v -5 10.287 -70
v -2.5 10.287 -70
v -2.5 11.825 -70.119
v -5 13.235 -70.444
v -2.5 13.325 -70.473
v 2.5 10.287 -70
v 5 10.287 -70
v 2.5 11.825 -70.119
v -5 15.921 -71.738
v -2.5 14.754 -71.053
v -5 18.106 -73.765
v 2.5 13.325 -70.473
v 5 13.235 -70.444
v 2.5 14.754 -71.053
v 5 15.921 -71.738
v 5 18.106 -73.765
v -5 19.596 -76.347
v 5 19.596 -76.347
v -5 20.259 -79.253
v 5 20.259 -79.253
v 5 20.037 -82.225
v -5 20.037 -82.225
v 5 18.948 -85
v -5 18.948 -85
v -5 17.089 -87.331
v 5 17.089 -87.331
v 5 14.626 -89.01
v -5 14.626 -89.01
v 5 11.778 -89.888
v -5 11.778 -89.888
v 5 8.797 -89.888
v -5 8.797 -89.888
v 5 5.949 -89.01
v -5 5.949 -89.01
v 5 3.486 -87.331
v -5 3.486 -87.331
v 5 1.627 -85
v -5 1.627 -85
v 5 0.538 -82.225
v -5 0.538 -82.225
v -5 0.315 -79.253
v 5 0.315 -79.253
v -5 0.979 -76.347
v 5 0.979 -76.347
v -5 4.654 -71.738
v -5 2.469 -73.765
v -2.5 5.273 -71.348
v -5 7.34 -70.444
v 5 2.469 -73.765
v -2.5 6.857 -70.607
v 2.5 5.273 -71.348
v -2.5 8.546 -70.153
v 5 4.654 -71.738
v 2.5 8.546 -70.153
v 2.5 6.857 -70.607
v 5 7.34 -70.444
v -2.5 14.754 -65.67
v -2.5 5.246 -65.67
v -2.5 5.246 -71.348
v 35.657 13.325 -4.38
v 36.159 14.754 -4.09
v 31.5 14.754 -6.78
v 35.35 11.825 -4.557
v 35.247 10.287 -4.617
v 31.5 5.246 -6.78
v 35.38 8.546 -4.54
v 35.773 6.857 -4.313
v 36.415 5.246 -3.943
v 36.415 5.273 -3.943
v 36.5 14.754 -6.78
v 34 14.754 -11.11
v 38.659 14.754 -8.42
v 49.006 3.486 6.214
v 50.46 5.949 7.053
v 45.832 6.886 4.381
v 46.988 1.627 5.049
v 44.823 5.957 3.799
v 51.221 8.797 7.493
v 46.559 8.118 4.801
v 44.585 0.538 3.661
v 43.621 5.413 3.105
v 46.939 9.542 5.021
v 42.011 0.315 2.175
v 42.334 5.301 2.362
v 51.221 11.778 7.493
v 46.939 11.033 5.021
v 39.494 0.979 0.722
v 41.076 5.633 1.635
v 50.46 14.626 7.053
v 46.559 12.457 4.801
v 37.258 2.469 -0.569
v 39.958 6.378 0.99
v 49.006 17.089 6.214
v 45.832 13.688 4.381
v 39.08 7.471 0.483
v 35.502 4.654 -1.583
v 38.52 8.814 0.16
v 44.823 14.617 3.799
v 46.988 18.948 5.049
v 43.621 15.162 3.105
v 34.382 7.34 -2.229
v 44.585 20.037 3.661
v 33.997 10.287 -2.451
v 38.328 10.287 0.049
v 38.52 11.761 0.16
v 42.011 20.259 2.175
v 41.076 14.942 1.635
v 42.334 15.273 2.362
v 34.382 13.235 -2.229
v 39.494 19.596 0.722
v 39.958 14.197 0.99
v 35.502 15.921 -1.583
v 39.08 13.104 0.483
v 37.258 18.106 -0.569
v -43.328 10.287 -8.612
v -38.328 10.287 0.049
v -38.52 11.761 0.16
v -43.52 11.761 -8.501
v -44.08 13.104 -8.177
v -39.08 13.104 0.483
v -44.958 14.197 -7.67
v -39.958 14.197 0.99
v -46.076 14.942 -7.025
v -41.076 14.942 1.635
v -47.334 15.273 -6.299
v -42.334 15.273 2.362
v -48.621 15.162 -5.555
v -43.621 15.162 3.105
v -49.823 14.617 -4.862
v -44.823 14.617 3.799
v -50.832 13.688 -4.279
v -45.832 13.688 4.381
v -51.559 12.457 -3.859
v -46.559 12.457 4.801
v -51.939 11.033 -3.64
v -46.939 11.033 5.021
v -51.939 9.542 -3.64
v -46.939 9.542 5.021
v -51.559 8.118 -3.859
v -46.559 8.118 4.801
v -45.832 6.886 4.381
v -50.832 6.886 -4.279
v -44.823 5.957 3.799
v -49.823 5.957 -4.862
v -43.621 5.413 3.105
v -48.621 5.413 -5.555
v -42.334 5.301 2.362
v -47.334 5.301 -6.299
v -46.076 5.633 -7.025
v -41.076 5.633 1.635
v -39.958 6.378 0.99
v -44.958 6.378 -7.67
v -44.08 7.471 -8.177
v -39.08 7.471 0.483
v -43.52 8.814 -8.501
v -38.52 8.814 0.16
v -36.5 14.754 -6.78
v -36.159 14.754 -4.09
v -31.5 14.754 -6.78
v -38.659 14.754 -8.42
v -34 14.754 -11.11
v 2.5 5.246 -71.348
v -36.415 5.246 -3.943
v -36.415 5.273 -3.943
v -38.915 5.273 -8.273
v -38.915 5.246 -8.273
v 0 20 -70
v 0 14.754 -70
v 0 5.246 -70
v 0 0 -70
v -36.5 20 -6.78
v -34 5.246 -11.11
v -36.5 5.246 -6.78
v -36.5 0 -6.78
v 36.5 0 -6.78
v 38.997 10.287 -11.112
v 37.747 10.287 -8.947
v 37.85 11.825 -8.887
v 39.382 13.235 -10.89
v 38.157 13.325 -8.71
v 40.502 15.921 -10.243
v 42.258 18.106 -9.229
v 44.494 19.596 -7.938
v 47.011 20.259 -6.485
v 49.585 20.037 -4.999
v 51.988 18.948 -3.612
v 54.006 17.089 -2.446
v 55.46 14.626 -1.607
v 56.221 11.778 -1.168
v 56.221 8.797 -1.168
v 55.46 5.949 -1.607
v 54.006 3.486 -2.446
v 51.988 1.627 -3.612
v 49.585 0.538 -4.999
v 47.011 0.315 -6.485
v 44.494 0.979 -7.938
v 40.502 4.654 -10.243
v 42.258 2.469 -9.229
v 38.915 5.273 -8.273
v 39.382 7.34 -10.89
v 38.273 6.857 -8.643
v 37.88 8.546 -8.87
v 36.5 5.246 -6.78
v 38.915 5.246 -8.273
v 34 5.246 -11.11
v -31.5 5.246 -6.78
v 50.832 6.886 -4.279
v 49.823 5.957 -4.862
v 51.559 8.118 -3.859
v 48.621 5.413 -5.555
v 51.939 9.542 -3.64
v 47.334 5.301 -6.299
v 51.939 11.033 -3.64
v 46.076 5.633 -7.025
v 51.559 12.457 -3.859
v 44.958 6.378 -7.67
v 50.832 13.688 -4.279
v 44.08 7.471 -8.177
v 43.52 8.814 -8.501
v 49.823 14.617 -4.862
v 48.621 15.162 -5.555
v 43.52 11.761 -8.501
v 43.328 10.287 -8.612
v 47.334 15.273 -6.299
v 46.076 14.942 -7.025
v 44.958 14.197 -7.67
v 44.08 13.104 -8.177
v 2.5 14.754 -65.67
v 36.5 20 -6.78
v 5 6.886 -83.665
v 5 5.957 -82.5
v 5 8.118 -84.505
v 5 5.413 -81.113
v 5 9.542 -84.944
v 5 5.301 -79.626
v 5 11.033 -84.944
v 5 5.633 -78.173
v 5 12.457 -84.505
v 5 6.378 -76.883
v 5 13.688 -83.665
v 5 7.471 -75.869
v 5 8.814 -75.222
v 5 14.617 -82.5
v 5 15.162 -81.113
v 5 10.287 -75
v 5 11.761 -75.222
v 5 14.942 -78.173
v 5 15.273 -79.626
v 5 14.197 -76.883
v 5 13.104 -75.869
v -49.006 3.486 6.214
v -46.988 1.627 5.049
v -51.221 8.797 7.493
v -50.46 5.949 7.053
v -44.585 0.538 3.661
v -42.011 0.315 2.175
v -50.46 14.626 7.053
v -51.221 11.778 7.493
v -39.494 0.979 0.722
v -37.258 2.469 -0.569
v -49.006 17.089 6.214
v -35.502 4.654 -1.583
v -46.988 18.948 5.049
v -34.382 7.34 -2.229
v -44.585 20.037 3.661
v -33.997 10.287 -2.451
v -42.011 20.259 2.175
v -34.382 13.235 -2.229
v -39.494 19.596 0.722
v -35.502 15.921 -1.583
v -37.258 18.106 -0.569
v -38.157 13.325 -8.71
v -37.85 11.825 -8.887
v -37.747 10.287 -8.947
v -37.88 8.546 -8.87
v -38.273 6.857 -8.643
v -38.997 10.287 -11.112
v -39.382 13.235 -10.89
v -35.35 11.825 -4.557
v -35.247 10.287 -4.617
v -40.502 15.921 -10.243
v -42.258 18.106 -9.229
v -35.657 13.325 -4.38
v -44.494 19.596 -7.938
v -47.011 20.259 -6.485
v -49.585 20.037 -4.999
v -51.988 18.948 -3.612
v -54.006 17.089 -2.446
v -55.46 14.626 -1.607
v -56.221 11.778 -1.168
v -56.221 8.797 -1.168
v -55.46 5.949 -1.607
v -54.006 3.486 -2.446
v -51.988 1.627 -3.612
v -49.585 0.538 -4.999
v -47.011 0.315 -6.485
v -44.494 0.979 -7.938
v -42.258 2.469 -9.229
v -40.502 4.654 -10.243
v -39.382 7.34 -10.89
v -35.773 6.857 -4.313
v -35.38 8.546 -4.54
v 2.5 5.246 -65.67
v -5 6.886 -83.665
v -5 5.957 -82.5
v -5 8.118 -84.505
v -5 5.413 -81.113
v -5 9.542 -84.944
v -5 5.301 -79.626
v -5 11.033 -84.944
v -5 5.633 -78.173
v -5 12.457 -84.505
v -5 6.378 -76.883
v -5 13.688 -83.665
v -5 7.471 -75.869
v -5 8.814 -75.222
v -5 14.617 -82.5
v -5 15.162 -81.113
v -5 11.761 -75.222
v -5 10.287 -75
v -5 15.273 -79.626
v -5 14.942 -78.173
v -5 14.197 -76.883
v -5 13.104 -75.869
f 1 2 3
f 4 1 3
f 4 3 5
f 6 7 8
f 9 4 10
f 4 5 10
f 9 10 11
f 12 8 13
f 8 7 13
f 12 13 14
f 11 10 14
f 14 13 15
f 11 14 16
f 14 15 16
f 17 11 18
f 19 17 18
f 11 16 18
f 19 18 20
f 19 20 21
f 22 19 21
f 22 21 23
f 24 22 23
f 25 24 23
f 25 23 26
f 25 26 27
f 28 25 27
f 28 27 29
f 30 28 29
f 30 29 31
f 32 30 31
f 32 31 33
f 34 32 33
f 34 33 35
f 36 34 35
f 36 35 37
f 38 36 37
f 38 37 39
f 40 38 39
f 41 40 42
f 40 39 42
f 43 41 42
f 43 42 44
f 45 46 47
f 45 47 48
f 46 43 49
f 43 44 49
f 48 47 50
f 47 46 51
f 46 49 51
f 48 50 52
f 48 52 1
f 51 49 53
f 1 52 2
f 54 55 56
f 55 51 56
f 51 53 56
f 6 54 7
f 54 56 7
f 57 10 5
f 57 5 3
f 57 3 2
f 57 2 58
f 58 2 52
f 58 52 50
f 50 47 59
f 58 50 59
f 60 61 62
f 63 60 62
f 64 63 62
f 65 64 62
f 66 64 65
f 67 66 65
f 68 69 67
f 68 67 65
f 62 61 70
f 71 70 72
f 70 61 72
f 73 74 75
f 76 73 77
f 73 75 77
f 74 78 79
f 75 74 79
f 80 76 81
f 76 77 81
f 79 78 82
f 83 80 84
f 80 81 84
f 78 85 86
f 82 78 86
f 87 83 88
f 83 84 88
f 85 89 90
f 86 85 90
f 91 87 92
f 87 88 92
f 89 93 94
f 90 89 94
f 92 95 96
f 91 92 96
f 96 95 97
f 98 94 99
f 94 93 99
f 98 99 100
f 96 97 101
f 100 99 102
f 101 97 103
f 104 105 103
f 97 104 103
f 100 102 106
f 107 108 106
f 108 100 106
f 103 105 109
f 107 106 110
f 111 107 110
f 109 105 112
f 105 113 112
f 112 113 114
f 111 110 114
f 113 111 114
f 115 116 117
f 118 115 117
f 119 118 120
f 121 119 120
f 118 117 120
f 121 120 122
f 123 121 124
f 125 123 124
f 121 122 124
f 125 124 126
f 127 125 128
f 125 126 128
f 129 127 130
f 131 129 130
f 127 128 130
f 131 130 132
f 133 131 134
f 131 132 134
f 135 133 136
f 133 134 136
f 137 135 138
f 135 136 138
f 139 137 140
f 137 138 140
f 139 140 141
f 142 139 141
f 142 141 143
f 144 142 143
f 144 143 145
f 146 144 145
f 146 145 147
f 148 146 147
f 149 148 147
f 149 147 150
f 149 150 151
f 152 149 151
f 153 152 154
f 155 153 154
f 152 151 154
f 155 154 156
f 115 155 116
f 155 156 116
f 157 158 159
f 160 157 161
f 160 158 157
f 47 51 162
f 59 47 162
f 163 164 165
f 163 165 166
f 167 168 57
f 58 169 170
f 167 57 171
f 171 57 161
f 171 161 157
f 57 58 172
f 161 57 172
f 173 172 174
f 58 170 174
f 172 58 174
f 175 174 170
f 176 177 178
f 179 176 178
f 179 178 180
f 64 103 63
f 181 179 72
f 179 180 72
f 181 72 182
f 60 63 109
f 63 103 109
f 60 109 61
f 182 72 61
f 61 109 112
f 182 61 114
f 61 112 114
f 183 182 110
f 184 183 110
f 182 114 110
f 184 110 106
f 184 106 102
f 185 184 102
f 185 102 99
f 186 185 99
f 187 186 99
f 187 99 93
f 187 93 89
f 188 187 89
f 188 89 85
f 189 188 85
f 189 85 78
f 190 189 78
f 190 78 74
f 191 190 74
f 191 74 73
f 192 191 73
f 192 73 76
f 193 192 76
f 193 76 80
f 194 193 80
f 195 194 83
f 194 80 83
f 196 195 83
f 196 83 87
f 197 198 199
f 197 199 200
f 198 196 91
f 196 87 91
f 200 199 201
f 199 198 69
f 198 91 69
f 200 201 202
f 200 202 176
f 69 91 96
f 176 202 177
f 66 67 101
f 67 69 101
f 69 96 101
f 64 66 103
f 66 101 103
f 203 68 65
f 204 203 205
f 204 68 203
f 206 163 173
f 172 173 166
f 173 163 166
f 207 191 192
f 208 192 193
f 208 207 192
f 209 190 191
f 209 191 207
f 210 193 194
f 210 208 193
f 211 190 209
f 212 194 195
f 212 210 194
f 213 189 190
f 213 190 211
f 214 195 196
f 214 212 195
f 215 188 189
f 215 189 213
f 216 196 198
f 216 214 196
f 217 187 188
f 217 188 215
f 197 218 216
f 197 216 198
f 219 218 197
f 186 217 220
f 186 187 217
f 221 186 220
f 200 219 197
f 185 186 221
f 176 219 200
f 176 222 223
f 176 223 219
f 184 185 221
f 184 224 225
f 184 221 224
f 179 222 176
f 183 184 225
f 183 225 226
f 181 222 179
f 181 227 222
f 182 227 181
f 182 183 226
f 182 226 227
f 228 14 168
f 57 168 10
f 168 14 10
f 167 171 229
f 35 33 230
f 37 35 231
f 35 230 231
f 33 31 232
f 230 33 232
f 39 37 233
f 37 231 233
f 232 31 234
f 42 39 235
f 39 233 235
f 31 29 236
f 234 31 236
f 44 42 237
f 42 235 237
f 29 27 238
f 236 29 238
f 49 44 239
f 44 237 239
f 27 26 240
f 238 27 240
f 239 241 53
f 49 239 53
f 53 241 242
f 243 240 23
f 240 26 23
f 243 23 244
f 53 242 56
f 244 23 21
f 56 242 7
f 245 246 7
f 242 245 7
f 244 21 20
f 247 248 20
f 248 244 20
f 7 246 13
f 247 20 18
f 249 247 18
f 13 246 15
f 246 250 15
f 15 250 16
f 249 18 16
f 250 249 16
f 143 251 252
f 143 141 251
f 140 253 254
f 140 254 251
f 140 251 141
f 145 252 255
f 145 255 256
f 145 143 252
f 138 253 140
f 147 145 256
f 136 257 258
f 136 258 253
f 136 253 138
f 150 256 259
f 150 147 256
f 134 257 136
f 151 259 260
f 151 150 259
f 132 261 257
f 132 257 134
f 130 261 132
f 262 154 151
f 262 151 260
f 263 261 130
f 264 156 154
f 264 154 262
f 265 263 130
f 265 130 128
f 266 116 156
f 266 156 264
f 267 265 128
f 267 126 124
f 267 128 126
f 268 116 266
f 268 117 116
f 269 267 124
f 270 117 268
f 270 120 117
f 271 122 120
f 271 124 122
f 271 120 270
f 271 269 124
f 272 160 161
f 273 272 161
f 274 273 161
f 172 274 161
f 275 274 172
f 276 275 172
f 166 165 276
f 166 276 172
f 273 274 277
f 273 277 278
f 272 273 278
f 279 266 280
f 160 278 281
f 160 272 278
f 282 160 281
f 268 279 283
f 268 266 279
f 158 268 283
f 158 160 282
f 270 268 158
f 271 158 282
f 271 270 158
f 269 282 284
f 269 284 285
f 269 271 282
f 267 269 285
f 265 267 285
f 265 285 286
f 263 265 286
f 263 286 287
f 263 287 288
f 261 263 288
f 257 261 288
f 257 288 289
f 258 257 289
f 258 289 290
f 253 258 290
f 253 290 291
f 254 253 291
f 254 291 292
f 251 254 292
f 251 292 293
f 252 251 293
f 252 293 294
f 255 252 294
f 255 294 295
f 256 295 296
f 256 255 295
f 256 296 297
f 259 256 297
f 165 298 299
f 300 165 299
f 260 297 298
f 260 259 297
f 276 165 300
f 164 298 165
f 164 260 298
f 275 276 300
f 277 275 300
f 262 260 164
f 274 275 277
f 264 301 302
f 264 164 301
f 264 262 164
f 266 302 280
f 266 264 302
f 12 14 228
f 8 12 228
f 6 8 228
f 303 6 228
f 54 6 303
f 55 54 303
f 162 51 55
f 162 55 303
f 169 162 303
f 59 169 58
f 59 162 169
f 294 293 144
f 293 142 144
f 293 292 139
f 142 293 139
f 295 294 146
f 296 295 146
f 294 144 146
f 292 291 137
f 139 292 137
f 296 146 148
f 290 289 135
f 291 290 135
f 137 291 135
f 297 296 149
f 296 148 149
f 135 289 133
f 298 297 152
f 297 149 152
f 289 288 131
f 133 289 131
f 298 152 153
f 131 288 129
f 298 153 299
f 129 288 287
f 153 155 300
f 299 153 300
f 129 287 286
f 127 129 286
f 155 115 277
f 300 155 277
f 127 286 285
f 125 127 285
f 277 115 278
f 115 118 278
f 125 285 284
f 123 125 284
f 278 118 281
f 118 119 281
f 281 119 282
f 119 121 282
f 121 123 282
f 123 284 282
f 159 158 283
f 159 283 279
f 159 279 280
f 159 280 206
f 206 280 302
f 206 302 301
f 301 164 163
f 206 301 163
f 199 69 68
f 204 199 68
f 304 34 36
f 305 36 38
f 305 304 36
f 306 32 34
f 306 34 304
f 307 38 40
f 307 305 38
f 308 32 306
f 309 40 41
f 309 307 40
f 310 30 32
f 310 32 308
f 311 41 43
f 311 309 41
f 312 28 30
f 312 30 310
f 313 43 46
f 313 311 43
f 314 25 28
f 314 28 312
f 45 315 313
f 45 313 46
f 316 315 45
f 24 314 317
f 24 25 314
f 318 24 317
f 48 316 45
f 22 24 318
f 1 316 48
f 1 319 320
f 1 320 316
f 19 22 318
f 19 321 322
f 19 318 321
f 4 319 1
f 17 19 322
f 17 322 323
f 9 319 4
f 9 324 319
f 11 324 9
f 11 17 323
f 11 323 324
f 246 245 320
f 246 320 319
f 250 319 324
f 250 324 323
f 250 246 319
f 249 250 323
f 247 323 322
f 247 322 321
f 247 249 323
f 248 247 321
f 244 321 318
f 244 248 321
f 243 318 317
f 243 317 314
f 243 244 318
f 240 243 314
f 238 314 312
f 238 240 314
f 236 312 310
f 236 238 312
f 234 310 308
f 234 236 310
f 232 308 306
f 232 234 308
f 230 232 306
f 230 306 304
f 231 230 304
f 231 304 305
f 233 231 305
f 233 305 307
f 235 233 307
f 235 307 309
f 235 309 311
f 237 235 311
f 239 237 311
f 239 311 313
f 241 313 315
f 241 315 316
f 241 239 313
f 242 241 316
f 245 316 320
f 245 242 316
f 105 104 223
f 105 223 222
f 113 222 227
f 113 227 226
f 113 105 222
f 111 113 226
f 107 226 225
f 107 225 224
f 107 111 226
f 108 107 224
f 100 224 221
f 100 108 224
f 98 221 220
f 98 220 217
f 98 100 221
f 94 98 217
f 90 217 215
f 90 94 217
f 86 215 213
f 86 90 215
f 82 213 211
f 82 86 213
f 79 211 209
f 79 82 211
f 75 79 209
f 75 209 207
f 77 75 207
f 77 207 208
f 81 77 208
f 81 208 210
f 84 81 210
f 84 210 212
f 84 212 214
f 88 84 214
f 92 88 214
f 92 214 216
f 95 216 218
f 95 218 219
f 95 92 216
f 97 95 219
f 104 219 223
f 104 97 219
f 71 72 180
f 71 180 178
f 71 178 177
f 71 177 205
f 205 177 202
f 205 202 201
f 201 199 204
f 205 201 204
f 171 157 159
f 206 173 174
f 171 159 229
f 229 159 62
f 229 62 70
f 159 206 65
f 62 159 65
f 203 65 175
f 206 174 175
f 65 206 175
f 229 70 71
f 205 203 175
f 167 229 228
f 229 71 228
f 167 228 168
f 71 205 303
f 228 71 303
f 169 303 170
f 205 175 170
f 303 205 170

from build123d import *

# Parameters (mm, degrees)
BOSS_EXTRUDE1_DEPTH      = 20
BOSS_EXTRUDE2_DEPTH      = 5
BOSS_EXTRUDE2_DEPTH_BACK = 5
SKETCH3_R                = 10
SKETCH3_R_2              = 5
BOSS_EXTRUDE3_DEPTH      = 2.5
BOSS_EXTRUDE3_DEPTH_BACK = 2.5
SKETCH4_W                = 9.507770028
SKETCH4_H                = 1.347875139
MOVE_FACE1_BY            = 11.3
BODY_MOVE_COPY2_ANGLE    = 60
BODY_MOVE_COPY3_ANGLE    = 180


with BuildPart() as part:
    # Sketch1 → Boss-Extrude1 (new body)
    with BuildSketch(Plane(origin=(0, 0, 0), x_dir=(1, 0, 0), z_dir=(0, 1, 0))):
        Polygon((-36.5, 6.780145524), (36.5, 6.780145524), (0, 70), align=None)
    extrude(amount=BOSS_EXTRUDE1_DEPTH)


with BuildPart() as body_2:
    # Sketch3 → Boss-Extrude2 (new, two sides: drawn at the far end of the back side and taken through both)
    with BuildSketch(Plane(origin=(0, 0, 0), x_dir=(0, -1, 0), z_dir=(-1, 0, 0)).offset(-BOSS_EXTRUDE2_DEPTH_BACK)):
        with Locations(Location((-10.287349531, -80, 0), (0, 0, 90))):
            Circle(SKETCH3_R)
        with Locations(Location((-10.287349531, -80, 0), (0, 0, 90))):
            Circle(SKETCH3_R_2, mode=Mode.SUBTRACT)
    extrude(amount=BOSS_EXTRUDE2_DEPTH + BOSS_EXTRUDE2_DEPTH_BACK)

    # Sketch4 → Boss-Extrude3 (add, two sides: drawn at the far end of the back side and taken through both)
    with BuildSketch(Plane(origin=(0, 0, 0), x_dir=(0, -1, 0), z_dir=(-1, 0, 0)).offset(-BOSS_EXTRUDE3_DEPTH_BACK)):
        with Locations((-10, -70.673937569)):
            Rectangle(SKETCH4_W, SKETCH4_H)
    extrude(amount=BOSS_EXTRUDE3_DEPTH + BOSS_EXTRUDE3_DEPTH_BACK)

    # Move Face1: a face moved outward by 11.3
    extrude(body_2.faces().sort_by_distance((0, 10, -70))[0], amount=MOVE_FACE1_BY, dir=(0, 0, 1))


with BuildPart() as body_3:
    # Body-Move/Copy1: copy of body 2
    add(body_2.part.moved(Location((50, 0, 0))))


with BuildPart() as body_3_1:
    # Body-Move/Copy2: read off the stored shape, not the designer's step
    # Body-Move/Copy2: moved
    add(body_3.part.moved(Location((-25.8782217, 0, 45.4663337))).rotate(Axis((0, 0, 0), (0, 1, 0)), BODY_MOVE_COPY2_ANGLE))


with BuildPart() as body_3_2:
    # Body-Move/Copy3: moved
    add(body_3_1.part.rotate(Axis((-13.578099639, 0, -36.414437667), (0, 1, 0)), BODY_MOVE_COPY3_ANGLE))


with BuildPart() as body_3_3:
    # Body-Move/Copy4: moved
    add(body_3_2.part.moved(Location((60.621778265, 0, 35))))


with BuildPart() as body_3_4:
    # Body-Move/Copy5: read off the stored shape, not the designer's step
    # Body-Move/Copy5: moved
    add(body_3_3.part.moved(Location((-5.5290056, 0, -3.1921729))))


with BuildPart() as body_3_5:
    # Body-Move/Copy6: read off the stored shape, not the designer's step
    # Body-Move/Copy6: moved
    add(body_3_4.part.moved(Location((-0.625, 0, 1.0825318))))


with BuildPart() as body_4:
    # Mirror1: mirrored copy
    add(body_3_5.part.mirror(Plane.ZY))


with BuildPart() as part_1:
    add(part.part)

    # Combine1: union body 2, body 3, body 4
    add(body_2.part)
    add(body_3_5.part)
    add(body_4.part)


solid = part_1.part
